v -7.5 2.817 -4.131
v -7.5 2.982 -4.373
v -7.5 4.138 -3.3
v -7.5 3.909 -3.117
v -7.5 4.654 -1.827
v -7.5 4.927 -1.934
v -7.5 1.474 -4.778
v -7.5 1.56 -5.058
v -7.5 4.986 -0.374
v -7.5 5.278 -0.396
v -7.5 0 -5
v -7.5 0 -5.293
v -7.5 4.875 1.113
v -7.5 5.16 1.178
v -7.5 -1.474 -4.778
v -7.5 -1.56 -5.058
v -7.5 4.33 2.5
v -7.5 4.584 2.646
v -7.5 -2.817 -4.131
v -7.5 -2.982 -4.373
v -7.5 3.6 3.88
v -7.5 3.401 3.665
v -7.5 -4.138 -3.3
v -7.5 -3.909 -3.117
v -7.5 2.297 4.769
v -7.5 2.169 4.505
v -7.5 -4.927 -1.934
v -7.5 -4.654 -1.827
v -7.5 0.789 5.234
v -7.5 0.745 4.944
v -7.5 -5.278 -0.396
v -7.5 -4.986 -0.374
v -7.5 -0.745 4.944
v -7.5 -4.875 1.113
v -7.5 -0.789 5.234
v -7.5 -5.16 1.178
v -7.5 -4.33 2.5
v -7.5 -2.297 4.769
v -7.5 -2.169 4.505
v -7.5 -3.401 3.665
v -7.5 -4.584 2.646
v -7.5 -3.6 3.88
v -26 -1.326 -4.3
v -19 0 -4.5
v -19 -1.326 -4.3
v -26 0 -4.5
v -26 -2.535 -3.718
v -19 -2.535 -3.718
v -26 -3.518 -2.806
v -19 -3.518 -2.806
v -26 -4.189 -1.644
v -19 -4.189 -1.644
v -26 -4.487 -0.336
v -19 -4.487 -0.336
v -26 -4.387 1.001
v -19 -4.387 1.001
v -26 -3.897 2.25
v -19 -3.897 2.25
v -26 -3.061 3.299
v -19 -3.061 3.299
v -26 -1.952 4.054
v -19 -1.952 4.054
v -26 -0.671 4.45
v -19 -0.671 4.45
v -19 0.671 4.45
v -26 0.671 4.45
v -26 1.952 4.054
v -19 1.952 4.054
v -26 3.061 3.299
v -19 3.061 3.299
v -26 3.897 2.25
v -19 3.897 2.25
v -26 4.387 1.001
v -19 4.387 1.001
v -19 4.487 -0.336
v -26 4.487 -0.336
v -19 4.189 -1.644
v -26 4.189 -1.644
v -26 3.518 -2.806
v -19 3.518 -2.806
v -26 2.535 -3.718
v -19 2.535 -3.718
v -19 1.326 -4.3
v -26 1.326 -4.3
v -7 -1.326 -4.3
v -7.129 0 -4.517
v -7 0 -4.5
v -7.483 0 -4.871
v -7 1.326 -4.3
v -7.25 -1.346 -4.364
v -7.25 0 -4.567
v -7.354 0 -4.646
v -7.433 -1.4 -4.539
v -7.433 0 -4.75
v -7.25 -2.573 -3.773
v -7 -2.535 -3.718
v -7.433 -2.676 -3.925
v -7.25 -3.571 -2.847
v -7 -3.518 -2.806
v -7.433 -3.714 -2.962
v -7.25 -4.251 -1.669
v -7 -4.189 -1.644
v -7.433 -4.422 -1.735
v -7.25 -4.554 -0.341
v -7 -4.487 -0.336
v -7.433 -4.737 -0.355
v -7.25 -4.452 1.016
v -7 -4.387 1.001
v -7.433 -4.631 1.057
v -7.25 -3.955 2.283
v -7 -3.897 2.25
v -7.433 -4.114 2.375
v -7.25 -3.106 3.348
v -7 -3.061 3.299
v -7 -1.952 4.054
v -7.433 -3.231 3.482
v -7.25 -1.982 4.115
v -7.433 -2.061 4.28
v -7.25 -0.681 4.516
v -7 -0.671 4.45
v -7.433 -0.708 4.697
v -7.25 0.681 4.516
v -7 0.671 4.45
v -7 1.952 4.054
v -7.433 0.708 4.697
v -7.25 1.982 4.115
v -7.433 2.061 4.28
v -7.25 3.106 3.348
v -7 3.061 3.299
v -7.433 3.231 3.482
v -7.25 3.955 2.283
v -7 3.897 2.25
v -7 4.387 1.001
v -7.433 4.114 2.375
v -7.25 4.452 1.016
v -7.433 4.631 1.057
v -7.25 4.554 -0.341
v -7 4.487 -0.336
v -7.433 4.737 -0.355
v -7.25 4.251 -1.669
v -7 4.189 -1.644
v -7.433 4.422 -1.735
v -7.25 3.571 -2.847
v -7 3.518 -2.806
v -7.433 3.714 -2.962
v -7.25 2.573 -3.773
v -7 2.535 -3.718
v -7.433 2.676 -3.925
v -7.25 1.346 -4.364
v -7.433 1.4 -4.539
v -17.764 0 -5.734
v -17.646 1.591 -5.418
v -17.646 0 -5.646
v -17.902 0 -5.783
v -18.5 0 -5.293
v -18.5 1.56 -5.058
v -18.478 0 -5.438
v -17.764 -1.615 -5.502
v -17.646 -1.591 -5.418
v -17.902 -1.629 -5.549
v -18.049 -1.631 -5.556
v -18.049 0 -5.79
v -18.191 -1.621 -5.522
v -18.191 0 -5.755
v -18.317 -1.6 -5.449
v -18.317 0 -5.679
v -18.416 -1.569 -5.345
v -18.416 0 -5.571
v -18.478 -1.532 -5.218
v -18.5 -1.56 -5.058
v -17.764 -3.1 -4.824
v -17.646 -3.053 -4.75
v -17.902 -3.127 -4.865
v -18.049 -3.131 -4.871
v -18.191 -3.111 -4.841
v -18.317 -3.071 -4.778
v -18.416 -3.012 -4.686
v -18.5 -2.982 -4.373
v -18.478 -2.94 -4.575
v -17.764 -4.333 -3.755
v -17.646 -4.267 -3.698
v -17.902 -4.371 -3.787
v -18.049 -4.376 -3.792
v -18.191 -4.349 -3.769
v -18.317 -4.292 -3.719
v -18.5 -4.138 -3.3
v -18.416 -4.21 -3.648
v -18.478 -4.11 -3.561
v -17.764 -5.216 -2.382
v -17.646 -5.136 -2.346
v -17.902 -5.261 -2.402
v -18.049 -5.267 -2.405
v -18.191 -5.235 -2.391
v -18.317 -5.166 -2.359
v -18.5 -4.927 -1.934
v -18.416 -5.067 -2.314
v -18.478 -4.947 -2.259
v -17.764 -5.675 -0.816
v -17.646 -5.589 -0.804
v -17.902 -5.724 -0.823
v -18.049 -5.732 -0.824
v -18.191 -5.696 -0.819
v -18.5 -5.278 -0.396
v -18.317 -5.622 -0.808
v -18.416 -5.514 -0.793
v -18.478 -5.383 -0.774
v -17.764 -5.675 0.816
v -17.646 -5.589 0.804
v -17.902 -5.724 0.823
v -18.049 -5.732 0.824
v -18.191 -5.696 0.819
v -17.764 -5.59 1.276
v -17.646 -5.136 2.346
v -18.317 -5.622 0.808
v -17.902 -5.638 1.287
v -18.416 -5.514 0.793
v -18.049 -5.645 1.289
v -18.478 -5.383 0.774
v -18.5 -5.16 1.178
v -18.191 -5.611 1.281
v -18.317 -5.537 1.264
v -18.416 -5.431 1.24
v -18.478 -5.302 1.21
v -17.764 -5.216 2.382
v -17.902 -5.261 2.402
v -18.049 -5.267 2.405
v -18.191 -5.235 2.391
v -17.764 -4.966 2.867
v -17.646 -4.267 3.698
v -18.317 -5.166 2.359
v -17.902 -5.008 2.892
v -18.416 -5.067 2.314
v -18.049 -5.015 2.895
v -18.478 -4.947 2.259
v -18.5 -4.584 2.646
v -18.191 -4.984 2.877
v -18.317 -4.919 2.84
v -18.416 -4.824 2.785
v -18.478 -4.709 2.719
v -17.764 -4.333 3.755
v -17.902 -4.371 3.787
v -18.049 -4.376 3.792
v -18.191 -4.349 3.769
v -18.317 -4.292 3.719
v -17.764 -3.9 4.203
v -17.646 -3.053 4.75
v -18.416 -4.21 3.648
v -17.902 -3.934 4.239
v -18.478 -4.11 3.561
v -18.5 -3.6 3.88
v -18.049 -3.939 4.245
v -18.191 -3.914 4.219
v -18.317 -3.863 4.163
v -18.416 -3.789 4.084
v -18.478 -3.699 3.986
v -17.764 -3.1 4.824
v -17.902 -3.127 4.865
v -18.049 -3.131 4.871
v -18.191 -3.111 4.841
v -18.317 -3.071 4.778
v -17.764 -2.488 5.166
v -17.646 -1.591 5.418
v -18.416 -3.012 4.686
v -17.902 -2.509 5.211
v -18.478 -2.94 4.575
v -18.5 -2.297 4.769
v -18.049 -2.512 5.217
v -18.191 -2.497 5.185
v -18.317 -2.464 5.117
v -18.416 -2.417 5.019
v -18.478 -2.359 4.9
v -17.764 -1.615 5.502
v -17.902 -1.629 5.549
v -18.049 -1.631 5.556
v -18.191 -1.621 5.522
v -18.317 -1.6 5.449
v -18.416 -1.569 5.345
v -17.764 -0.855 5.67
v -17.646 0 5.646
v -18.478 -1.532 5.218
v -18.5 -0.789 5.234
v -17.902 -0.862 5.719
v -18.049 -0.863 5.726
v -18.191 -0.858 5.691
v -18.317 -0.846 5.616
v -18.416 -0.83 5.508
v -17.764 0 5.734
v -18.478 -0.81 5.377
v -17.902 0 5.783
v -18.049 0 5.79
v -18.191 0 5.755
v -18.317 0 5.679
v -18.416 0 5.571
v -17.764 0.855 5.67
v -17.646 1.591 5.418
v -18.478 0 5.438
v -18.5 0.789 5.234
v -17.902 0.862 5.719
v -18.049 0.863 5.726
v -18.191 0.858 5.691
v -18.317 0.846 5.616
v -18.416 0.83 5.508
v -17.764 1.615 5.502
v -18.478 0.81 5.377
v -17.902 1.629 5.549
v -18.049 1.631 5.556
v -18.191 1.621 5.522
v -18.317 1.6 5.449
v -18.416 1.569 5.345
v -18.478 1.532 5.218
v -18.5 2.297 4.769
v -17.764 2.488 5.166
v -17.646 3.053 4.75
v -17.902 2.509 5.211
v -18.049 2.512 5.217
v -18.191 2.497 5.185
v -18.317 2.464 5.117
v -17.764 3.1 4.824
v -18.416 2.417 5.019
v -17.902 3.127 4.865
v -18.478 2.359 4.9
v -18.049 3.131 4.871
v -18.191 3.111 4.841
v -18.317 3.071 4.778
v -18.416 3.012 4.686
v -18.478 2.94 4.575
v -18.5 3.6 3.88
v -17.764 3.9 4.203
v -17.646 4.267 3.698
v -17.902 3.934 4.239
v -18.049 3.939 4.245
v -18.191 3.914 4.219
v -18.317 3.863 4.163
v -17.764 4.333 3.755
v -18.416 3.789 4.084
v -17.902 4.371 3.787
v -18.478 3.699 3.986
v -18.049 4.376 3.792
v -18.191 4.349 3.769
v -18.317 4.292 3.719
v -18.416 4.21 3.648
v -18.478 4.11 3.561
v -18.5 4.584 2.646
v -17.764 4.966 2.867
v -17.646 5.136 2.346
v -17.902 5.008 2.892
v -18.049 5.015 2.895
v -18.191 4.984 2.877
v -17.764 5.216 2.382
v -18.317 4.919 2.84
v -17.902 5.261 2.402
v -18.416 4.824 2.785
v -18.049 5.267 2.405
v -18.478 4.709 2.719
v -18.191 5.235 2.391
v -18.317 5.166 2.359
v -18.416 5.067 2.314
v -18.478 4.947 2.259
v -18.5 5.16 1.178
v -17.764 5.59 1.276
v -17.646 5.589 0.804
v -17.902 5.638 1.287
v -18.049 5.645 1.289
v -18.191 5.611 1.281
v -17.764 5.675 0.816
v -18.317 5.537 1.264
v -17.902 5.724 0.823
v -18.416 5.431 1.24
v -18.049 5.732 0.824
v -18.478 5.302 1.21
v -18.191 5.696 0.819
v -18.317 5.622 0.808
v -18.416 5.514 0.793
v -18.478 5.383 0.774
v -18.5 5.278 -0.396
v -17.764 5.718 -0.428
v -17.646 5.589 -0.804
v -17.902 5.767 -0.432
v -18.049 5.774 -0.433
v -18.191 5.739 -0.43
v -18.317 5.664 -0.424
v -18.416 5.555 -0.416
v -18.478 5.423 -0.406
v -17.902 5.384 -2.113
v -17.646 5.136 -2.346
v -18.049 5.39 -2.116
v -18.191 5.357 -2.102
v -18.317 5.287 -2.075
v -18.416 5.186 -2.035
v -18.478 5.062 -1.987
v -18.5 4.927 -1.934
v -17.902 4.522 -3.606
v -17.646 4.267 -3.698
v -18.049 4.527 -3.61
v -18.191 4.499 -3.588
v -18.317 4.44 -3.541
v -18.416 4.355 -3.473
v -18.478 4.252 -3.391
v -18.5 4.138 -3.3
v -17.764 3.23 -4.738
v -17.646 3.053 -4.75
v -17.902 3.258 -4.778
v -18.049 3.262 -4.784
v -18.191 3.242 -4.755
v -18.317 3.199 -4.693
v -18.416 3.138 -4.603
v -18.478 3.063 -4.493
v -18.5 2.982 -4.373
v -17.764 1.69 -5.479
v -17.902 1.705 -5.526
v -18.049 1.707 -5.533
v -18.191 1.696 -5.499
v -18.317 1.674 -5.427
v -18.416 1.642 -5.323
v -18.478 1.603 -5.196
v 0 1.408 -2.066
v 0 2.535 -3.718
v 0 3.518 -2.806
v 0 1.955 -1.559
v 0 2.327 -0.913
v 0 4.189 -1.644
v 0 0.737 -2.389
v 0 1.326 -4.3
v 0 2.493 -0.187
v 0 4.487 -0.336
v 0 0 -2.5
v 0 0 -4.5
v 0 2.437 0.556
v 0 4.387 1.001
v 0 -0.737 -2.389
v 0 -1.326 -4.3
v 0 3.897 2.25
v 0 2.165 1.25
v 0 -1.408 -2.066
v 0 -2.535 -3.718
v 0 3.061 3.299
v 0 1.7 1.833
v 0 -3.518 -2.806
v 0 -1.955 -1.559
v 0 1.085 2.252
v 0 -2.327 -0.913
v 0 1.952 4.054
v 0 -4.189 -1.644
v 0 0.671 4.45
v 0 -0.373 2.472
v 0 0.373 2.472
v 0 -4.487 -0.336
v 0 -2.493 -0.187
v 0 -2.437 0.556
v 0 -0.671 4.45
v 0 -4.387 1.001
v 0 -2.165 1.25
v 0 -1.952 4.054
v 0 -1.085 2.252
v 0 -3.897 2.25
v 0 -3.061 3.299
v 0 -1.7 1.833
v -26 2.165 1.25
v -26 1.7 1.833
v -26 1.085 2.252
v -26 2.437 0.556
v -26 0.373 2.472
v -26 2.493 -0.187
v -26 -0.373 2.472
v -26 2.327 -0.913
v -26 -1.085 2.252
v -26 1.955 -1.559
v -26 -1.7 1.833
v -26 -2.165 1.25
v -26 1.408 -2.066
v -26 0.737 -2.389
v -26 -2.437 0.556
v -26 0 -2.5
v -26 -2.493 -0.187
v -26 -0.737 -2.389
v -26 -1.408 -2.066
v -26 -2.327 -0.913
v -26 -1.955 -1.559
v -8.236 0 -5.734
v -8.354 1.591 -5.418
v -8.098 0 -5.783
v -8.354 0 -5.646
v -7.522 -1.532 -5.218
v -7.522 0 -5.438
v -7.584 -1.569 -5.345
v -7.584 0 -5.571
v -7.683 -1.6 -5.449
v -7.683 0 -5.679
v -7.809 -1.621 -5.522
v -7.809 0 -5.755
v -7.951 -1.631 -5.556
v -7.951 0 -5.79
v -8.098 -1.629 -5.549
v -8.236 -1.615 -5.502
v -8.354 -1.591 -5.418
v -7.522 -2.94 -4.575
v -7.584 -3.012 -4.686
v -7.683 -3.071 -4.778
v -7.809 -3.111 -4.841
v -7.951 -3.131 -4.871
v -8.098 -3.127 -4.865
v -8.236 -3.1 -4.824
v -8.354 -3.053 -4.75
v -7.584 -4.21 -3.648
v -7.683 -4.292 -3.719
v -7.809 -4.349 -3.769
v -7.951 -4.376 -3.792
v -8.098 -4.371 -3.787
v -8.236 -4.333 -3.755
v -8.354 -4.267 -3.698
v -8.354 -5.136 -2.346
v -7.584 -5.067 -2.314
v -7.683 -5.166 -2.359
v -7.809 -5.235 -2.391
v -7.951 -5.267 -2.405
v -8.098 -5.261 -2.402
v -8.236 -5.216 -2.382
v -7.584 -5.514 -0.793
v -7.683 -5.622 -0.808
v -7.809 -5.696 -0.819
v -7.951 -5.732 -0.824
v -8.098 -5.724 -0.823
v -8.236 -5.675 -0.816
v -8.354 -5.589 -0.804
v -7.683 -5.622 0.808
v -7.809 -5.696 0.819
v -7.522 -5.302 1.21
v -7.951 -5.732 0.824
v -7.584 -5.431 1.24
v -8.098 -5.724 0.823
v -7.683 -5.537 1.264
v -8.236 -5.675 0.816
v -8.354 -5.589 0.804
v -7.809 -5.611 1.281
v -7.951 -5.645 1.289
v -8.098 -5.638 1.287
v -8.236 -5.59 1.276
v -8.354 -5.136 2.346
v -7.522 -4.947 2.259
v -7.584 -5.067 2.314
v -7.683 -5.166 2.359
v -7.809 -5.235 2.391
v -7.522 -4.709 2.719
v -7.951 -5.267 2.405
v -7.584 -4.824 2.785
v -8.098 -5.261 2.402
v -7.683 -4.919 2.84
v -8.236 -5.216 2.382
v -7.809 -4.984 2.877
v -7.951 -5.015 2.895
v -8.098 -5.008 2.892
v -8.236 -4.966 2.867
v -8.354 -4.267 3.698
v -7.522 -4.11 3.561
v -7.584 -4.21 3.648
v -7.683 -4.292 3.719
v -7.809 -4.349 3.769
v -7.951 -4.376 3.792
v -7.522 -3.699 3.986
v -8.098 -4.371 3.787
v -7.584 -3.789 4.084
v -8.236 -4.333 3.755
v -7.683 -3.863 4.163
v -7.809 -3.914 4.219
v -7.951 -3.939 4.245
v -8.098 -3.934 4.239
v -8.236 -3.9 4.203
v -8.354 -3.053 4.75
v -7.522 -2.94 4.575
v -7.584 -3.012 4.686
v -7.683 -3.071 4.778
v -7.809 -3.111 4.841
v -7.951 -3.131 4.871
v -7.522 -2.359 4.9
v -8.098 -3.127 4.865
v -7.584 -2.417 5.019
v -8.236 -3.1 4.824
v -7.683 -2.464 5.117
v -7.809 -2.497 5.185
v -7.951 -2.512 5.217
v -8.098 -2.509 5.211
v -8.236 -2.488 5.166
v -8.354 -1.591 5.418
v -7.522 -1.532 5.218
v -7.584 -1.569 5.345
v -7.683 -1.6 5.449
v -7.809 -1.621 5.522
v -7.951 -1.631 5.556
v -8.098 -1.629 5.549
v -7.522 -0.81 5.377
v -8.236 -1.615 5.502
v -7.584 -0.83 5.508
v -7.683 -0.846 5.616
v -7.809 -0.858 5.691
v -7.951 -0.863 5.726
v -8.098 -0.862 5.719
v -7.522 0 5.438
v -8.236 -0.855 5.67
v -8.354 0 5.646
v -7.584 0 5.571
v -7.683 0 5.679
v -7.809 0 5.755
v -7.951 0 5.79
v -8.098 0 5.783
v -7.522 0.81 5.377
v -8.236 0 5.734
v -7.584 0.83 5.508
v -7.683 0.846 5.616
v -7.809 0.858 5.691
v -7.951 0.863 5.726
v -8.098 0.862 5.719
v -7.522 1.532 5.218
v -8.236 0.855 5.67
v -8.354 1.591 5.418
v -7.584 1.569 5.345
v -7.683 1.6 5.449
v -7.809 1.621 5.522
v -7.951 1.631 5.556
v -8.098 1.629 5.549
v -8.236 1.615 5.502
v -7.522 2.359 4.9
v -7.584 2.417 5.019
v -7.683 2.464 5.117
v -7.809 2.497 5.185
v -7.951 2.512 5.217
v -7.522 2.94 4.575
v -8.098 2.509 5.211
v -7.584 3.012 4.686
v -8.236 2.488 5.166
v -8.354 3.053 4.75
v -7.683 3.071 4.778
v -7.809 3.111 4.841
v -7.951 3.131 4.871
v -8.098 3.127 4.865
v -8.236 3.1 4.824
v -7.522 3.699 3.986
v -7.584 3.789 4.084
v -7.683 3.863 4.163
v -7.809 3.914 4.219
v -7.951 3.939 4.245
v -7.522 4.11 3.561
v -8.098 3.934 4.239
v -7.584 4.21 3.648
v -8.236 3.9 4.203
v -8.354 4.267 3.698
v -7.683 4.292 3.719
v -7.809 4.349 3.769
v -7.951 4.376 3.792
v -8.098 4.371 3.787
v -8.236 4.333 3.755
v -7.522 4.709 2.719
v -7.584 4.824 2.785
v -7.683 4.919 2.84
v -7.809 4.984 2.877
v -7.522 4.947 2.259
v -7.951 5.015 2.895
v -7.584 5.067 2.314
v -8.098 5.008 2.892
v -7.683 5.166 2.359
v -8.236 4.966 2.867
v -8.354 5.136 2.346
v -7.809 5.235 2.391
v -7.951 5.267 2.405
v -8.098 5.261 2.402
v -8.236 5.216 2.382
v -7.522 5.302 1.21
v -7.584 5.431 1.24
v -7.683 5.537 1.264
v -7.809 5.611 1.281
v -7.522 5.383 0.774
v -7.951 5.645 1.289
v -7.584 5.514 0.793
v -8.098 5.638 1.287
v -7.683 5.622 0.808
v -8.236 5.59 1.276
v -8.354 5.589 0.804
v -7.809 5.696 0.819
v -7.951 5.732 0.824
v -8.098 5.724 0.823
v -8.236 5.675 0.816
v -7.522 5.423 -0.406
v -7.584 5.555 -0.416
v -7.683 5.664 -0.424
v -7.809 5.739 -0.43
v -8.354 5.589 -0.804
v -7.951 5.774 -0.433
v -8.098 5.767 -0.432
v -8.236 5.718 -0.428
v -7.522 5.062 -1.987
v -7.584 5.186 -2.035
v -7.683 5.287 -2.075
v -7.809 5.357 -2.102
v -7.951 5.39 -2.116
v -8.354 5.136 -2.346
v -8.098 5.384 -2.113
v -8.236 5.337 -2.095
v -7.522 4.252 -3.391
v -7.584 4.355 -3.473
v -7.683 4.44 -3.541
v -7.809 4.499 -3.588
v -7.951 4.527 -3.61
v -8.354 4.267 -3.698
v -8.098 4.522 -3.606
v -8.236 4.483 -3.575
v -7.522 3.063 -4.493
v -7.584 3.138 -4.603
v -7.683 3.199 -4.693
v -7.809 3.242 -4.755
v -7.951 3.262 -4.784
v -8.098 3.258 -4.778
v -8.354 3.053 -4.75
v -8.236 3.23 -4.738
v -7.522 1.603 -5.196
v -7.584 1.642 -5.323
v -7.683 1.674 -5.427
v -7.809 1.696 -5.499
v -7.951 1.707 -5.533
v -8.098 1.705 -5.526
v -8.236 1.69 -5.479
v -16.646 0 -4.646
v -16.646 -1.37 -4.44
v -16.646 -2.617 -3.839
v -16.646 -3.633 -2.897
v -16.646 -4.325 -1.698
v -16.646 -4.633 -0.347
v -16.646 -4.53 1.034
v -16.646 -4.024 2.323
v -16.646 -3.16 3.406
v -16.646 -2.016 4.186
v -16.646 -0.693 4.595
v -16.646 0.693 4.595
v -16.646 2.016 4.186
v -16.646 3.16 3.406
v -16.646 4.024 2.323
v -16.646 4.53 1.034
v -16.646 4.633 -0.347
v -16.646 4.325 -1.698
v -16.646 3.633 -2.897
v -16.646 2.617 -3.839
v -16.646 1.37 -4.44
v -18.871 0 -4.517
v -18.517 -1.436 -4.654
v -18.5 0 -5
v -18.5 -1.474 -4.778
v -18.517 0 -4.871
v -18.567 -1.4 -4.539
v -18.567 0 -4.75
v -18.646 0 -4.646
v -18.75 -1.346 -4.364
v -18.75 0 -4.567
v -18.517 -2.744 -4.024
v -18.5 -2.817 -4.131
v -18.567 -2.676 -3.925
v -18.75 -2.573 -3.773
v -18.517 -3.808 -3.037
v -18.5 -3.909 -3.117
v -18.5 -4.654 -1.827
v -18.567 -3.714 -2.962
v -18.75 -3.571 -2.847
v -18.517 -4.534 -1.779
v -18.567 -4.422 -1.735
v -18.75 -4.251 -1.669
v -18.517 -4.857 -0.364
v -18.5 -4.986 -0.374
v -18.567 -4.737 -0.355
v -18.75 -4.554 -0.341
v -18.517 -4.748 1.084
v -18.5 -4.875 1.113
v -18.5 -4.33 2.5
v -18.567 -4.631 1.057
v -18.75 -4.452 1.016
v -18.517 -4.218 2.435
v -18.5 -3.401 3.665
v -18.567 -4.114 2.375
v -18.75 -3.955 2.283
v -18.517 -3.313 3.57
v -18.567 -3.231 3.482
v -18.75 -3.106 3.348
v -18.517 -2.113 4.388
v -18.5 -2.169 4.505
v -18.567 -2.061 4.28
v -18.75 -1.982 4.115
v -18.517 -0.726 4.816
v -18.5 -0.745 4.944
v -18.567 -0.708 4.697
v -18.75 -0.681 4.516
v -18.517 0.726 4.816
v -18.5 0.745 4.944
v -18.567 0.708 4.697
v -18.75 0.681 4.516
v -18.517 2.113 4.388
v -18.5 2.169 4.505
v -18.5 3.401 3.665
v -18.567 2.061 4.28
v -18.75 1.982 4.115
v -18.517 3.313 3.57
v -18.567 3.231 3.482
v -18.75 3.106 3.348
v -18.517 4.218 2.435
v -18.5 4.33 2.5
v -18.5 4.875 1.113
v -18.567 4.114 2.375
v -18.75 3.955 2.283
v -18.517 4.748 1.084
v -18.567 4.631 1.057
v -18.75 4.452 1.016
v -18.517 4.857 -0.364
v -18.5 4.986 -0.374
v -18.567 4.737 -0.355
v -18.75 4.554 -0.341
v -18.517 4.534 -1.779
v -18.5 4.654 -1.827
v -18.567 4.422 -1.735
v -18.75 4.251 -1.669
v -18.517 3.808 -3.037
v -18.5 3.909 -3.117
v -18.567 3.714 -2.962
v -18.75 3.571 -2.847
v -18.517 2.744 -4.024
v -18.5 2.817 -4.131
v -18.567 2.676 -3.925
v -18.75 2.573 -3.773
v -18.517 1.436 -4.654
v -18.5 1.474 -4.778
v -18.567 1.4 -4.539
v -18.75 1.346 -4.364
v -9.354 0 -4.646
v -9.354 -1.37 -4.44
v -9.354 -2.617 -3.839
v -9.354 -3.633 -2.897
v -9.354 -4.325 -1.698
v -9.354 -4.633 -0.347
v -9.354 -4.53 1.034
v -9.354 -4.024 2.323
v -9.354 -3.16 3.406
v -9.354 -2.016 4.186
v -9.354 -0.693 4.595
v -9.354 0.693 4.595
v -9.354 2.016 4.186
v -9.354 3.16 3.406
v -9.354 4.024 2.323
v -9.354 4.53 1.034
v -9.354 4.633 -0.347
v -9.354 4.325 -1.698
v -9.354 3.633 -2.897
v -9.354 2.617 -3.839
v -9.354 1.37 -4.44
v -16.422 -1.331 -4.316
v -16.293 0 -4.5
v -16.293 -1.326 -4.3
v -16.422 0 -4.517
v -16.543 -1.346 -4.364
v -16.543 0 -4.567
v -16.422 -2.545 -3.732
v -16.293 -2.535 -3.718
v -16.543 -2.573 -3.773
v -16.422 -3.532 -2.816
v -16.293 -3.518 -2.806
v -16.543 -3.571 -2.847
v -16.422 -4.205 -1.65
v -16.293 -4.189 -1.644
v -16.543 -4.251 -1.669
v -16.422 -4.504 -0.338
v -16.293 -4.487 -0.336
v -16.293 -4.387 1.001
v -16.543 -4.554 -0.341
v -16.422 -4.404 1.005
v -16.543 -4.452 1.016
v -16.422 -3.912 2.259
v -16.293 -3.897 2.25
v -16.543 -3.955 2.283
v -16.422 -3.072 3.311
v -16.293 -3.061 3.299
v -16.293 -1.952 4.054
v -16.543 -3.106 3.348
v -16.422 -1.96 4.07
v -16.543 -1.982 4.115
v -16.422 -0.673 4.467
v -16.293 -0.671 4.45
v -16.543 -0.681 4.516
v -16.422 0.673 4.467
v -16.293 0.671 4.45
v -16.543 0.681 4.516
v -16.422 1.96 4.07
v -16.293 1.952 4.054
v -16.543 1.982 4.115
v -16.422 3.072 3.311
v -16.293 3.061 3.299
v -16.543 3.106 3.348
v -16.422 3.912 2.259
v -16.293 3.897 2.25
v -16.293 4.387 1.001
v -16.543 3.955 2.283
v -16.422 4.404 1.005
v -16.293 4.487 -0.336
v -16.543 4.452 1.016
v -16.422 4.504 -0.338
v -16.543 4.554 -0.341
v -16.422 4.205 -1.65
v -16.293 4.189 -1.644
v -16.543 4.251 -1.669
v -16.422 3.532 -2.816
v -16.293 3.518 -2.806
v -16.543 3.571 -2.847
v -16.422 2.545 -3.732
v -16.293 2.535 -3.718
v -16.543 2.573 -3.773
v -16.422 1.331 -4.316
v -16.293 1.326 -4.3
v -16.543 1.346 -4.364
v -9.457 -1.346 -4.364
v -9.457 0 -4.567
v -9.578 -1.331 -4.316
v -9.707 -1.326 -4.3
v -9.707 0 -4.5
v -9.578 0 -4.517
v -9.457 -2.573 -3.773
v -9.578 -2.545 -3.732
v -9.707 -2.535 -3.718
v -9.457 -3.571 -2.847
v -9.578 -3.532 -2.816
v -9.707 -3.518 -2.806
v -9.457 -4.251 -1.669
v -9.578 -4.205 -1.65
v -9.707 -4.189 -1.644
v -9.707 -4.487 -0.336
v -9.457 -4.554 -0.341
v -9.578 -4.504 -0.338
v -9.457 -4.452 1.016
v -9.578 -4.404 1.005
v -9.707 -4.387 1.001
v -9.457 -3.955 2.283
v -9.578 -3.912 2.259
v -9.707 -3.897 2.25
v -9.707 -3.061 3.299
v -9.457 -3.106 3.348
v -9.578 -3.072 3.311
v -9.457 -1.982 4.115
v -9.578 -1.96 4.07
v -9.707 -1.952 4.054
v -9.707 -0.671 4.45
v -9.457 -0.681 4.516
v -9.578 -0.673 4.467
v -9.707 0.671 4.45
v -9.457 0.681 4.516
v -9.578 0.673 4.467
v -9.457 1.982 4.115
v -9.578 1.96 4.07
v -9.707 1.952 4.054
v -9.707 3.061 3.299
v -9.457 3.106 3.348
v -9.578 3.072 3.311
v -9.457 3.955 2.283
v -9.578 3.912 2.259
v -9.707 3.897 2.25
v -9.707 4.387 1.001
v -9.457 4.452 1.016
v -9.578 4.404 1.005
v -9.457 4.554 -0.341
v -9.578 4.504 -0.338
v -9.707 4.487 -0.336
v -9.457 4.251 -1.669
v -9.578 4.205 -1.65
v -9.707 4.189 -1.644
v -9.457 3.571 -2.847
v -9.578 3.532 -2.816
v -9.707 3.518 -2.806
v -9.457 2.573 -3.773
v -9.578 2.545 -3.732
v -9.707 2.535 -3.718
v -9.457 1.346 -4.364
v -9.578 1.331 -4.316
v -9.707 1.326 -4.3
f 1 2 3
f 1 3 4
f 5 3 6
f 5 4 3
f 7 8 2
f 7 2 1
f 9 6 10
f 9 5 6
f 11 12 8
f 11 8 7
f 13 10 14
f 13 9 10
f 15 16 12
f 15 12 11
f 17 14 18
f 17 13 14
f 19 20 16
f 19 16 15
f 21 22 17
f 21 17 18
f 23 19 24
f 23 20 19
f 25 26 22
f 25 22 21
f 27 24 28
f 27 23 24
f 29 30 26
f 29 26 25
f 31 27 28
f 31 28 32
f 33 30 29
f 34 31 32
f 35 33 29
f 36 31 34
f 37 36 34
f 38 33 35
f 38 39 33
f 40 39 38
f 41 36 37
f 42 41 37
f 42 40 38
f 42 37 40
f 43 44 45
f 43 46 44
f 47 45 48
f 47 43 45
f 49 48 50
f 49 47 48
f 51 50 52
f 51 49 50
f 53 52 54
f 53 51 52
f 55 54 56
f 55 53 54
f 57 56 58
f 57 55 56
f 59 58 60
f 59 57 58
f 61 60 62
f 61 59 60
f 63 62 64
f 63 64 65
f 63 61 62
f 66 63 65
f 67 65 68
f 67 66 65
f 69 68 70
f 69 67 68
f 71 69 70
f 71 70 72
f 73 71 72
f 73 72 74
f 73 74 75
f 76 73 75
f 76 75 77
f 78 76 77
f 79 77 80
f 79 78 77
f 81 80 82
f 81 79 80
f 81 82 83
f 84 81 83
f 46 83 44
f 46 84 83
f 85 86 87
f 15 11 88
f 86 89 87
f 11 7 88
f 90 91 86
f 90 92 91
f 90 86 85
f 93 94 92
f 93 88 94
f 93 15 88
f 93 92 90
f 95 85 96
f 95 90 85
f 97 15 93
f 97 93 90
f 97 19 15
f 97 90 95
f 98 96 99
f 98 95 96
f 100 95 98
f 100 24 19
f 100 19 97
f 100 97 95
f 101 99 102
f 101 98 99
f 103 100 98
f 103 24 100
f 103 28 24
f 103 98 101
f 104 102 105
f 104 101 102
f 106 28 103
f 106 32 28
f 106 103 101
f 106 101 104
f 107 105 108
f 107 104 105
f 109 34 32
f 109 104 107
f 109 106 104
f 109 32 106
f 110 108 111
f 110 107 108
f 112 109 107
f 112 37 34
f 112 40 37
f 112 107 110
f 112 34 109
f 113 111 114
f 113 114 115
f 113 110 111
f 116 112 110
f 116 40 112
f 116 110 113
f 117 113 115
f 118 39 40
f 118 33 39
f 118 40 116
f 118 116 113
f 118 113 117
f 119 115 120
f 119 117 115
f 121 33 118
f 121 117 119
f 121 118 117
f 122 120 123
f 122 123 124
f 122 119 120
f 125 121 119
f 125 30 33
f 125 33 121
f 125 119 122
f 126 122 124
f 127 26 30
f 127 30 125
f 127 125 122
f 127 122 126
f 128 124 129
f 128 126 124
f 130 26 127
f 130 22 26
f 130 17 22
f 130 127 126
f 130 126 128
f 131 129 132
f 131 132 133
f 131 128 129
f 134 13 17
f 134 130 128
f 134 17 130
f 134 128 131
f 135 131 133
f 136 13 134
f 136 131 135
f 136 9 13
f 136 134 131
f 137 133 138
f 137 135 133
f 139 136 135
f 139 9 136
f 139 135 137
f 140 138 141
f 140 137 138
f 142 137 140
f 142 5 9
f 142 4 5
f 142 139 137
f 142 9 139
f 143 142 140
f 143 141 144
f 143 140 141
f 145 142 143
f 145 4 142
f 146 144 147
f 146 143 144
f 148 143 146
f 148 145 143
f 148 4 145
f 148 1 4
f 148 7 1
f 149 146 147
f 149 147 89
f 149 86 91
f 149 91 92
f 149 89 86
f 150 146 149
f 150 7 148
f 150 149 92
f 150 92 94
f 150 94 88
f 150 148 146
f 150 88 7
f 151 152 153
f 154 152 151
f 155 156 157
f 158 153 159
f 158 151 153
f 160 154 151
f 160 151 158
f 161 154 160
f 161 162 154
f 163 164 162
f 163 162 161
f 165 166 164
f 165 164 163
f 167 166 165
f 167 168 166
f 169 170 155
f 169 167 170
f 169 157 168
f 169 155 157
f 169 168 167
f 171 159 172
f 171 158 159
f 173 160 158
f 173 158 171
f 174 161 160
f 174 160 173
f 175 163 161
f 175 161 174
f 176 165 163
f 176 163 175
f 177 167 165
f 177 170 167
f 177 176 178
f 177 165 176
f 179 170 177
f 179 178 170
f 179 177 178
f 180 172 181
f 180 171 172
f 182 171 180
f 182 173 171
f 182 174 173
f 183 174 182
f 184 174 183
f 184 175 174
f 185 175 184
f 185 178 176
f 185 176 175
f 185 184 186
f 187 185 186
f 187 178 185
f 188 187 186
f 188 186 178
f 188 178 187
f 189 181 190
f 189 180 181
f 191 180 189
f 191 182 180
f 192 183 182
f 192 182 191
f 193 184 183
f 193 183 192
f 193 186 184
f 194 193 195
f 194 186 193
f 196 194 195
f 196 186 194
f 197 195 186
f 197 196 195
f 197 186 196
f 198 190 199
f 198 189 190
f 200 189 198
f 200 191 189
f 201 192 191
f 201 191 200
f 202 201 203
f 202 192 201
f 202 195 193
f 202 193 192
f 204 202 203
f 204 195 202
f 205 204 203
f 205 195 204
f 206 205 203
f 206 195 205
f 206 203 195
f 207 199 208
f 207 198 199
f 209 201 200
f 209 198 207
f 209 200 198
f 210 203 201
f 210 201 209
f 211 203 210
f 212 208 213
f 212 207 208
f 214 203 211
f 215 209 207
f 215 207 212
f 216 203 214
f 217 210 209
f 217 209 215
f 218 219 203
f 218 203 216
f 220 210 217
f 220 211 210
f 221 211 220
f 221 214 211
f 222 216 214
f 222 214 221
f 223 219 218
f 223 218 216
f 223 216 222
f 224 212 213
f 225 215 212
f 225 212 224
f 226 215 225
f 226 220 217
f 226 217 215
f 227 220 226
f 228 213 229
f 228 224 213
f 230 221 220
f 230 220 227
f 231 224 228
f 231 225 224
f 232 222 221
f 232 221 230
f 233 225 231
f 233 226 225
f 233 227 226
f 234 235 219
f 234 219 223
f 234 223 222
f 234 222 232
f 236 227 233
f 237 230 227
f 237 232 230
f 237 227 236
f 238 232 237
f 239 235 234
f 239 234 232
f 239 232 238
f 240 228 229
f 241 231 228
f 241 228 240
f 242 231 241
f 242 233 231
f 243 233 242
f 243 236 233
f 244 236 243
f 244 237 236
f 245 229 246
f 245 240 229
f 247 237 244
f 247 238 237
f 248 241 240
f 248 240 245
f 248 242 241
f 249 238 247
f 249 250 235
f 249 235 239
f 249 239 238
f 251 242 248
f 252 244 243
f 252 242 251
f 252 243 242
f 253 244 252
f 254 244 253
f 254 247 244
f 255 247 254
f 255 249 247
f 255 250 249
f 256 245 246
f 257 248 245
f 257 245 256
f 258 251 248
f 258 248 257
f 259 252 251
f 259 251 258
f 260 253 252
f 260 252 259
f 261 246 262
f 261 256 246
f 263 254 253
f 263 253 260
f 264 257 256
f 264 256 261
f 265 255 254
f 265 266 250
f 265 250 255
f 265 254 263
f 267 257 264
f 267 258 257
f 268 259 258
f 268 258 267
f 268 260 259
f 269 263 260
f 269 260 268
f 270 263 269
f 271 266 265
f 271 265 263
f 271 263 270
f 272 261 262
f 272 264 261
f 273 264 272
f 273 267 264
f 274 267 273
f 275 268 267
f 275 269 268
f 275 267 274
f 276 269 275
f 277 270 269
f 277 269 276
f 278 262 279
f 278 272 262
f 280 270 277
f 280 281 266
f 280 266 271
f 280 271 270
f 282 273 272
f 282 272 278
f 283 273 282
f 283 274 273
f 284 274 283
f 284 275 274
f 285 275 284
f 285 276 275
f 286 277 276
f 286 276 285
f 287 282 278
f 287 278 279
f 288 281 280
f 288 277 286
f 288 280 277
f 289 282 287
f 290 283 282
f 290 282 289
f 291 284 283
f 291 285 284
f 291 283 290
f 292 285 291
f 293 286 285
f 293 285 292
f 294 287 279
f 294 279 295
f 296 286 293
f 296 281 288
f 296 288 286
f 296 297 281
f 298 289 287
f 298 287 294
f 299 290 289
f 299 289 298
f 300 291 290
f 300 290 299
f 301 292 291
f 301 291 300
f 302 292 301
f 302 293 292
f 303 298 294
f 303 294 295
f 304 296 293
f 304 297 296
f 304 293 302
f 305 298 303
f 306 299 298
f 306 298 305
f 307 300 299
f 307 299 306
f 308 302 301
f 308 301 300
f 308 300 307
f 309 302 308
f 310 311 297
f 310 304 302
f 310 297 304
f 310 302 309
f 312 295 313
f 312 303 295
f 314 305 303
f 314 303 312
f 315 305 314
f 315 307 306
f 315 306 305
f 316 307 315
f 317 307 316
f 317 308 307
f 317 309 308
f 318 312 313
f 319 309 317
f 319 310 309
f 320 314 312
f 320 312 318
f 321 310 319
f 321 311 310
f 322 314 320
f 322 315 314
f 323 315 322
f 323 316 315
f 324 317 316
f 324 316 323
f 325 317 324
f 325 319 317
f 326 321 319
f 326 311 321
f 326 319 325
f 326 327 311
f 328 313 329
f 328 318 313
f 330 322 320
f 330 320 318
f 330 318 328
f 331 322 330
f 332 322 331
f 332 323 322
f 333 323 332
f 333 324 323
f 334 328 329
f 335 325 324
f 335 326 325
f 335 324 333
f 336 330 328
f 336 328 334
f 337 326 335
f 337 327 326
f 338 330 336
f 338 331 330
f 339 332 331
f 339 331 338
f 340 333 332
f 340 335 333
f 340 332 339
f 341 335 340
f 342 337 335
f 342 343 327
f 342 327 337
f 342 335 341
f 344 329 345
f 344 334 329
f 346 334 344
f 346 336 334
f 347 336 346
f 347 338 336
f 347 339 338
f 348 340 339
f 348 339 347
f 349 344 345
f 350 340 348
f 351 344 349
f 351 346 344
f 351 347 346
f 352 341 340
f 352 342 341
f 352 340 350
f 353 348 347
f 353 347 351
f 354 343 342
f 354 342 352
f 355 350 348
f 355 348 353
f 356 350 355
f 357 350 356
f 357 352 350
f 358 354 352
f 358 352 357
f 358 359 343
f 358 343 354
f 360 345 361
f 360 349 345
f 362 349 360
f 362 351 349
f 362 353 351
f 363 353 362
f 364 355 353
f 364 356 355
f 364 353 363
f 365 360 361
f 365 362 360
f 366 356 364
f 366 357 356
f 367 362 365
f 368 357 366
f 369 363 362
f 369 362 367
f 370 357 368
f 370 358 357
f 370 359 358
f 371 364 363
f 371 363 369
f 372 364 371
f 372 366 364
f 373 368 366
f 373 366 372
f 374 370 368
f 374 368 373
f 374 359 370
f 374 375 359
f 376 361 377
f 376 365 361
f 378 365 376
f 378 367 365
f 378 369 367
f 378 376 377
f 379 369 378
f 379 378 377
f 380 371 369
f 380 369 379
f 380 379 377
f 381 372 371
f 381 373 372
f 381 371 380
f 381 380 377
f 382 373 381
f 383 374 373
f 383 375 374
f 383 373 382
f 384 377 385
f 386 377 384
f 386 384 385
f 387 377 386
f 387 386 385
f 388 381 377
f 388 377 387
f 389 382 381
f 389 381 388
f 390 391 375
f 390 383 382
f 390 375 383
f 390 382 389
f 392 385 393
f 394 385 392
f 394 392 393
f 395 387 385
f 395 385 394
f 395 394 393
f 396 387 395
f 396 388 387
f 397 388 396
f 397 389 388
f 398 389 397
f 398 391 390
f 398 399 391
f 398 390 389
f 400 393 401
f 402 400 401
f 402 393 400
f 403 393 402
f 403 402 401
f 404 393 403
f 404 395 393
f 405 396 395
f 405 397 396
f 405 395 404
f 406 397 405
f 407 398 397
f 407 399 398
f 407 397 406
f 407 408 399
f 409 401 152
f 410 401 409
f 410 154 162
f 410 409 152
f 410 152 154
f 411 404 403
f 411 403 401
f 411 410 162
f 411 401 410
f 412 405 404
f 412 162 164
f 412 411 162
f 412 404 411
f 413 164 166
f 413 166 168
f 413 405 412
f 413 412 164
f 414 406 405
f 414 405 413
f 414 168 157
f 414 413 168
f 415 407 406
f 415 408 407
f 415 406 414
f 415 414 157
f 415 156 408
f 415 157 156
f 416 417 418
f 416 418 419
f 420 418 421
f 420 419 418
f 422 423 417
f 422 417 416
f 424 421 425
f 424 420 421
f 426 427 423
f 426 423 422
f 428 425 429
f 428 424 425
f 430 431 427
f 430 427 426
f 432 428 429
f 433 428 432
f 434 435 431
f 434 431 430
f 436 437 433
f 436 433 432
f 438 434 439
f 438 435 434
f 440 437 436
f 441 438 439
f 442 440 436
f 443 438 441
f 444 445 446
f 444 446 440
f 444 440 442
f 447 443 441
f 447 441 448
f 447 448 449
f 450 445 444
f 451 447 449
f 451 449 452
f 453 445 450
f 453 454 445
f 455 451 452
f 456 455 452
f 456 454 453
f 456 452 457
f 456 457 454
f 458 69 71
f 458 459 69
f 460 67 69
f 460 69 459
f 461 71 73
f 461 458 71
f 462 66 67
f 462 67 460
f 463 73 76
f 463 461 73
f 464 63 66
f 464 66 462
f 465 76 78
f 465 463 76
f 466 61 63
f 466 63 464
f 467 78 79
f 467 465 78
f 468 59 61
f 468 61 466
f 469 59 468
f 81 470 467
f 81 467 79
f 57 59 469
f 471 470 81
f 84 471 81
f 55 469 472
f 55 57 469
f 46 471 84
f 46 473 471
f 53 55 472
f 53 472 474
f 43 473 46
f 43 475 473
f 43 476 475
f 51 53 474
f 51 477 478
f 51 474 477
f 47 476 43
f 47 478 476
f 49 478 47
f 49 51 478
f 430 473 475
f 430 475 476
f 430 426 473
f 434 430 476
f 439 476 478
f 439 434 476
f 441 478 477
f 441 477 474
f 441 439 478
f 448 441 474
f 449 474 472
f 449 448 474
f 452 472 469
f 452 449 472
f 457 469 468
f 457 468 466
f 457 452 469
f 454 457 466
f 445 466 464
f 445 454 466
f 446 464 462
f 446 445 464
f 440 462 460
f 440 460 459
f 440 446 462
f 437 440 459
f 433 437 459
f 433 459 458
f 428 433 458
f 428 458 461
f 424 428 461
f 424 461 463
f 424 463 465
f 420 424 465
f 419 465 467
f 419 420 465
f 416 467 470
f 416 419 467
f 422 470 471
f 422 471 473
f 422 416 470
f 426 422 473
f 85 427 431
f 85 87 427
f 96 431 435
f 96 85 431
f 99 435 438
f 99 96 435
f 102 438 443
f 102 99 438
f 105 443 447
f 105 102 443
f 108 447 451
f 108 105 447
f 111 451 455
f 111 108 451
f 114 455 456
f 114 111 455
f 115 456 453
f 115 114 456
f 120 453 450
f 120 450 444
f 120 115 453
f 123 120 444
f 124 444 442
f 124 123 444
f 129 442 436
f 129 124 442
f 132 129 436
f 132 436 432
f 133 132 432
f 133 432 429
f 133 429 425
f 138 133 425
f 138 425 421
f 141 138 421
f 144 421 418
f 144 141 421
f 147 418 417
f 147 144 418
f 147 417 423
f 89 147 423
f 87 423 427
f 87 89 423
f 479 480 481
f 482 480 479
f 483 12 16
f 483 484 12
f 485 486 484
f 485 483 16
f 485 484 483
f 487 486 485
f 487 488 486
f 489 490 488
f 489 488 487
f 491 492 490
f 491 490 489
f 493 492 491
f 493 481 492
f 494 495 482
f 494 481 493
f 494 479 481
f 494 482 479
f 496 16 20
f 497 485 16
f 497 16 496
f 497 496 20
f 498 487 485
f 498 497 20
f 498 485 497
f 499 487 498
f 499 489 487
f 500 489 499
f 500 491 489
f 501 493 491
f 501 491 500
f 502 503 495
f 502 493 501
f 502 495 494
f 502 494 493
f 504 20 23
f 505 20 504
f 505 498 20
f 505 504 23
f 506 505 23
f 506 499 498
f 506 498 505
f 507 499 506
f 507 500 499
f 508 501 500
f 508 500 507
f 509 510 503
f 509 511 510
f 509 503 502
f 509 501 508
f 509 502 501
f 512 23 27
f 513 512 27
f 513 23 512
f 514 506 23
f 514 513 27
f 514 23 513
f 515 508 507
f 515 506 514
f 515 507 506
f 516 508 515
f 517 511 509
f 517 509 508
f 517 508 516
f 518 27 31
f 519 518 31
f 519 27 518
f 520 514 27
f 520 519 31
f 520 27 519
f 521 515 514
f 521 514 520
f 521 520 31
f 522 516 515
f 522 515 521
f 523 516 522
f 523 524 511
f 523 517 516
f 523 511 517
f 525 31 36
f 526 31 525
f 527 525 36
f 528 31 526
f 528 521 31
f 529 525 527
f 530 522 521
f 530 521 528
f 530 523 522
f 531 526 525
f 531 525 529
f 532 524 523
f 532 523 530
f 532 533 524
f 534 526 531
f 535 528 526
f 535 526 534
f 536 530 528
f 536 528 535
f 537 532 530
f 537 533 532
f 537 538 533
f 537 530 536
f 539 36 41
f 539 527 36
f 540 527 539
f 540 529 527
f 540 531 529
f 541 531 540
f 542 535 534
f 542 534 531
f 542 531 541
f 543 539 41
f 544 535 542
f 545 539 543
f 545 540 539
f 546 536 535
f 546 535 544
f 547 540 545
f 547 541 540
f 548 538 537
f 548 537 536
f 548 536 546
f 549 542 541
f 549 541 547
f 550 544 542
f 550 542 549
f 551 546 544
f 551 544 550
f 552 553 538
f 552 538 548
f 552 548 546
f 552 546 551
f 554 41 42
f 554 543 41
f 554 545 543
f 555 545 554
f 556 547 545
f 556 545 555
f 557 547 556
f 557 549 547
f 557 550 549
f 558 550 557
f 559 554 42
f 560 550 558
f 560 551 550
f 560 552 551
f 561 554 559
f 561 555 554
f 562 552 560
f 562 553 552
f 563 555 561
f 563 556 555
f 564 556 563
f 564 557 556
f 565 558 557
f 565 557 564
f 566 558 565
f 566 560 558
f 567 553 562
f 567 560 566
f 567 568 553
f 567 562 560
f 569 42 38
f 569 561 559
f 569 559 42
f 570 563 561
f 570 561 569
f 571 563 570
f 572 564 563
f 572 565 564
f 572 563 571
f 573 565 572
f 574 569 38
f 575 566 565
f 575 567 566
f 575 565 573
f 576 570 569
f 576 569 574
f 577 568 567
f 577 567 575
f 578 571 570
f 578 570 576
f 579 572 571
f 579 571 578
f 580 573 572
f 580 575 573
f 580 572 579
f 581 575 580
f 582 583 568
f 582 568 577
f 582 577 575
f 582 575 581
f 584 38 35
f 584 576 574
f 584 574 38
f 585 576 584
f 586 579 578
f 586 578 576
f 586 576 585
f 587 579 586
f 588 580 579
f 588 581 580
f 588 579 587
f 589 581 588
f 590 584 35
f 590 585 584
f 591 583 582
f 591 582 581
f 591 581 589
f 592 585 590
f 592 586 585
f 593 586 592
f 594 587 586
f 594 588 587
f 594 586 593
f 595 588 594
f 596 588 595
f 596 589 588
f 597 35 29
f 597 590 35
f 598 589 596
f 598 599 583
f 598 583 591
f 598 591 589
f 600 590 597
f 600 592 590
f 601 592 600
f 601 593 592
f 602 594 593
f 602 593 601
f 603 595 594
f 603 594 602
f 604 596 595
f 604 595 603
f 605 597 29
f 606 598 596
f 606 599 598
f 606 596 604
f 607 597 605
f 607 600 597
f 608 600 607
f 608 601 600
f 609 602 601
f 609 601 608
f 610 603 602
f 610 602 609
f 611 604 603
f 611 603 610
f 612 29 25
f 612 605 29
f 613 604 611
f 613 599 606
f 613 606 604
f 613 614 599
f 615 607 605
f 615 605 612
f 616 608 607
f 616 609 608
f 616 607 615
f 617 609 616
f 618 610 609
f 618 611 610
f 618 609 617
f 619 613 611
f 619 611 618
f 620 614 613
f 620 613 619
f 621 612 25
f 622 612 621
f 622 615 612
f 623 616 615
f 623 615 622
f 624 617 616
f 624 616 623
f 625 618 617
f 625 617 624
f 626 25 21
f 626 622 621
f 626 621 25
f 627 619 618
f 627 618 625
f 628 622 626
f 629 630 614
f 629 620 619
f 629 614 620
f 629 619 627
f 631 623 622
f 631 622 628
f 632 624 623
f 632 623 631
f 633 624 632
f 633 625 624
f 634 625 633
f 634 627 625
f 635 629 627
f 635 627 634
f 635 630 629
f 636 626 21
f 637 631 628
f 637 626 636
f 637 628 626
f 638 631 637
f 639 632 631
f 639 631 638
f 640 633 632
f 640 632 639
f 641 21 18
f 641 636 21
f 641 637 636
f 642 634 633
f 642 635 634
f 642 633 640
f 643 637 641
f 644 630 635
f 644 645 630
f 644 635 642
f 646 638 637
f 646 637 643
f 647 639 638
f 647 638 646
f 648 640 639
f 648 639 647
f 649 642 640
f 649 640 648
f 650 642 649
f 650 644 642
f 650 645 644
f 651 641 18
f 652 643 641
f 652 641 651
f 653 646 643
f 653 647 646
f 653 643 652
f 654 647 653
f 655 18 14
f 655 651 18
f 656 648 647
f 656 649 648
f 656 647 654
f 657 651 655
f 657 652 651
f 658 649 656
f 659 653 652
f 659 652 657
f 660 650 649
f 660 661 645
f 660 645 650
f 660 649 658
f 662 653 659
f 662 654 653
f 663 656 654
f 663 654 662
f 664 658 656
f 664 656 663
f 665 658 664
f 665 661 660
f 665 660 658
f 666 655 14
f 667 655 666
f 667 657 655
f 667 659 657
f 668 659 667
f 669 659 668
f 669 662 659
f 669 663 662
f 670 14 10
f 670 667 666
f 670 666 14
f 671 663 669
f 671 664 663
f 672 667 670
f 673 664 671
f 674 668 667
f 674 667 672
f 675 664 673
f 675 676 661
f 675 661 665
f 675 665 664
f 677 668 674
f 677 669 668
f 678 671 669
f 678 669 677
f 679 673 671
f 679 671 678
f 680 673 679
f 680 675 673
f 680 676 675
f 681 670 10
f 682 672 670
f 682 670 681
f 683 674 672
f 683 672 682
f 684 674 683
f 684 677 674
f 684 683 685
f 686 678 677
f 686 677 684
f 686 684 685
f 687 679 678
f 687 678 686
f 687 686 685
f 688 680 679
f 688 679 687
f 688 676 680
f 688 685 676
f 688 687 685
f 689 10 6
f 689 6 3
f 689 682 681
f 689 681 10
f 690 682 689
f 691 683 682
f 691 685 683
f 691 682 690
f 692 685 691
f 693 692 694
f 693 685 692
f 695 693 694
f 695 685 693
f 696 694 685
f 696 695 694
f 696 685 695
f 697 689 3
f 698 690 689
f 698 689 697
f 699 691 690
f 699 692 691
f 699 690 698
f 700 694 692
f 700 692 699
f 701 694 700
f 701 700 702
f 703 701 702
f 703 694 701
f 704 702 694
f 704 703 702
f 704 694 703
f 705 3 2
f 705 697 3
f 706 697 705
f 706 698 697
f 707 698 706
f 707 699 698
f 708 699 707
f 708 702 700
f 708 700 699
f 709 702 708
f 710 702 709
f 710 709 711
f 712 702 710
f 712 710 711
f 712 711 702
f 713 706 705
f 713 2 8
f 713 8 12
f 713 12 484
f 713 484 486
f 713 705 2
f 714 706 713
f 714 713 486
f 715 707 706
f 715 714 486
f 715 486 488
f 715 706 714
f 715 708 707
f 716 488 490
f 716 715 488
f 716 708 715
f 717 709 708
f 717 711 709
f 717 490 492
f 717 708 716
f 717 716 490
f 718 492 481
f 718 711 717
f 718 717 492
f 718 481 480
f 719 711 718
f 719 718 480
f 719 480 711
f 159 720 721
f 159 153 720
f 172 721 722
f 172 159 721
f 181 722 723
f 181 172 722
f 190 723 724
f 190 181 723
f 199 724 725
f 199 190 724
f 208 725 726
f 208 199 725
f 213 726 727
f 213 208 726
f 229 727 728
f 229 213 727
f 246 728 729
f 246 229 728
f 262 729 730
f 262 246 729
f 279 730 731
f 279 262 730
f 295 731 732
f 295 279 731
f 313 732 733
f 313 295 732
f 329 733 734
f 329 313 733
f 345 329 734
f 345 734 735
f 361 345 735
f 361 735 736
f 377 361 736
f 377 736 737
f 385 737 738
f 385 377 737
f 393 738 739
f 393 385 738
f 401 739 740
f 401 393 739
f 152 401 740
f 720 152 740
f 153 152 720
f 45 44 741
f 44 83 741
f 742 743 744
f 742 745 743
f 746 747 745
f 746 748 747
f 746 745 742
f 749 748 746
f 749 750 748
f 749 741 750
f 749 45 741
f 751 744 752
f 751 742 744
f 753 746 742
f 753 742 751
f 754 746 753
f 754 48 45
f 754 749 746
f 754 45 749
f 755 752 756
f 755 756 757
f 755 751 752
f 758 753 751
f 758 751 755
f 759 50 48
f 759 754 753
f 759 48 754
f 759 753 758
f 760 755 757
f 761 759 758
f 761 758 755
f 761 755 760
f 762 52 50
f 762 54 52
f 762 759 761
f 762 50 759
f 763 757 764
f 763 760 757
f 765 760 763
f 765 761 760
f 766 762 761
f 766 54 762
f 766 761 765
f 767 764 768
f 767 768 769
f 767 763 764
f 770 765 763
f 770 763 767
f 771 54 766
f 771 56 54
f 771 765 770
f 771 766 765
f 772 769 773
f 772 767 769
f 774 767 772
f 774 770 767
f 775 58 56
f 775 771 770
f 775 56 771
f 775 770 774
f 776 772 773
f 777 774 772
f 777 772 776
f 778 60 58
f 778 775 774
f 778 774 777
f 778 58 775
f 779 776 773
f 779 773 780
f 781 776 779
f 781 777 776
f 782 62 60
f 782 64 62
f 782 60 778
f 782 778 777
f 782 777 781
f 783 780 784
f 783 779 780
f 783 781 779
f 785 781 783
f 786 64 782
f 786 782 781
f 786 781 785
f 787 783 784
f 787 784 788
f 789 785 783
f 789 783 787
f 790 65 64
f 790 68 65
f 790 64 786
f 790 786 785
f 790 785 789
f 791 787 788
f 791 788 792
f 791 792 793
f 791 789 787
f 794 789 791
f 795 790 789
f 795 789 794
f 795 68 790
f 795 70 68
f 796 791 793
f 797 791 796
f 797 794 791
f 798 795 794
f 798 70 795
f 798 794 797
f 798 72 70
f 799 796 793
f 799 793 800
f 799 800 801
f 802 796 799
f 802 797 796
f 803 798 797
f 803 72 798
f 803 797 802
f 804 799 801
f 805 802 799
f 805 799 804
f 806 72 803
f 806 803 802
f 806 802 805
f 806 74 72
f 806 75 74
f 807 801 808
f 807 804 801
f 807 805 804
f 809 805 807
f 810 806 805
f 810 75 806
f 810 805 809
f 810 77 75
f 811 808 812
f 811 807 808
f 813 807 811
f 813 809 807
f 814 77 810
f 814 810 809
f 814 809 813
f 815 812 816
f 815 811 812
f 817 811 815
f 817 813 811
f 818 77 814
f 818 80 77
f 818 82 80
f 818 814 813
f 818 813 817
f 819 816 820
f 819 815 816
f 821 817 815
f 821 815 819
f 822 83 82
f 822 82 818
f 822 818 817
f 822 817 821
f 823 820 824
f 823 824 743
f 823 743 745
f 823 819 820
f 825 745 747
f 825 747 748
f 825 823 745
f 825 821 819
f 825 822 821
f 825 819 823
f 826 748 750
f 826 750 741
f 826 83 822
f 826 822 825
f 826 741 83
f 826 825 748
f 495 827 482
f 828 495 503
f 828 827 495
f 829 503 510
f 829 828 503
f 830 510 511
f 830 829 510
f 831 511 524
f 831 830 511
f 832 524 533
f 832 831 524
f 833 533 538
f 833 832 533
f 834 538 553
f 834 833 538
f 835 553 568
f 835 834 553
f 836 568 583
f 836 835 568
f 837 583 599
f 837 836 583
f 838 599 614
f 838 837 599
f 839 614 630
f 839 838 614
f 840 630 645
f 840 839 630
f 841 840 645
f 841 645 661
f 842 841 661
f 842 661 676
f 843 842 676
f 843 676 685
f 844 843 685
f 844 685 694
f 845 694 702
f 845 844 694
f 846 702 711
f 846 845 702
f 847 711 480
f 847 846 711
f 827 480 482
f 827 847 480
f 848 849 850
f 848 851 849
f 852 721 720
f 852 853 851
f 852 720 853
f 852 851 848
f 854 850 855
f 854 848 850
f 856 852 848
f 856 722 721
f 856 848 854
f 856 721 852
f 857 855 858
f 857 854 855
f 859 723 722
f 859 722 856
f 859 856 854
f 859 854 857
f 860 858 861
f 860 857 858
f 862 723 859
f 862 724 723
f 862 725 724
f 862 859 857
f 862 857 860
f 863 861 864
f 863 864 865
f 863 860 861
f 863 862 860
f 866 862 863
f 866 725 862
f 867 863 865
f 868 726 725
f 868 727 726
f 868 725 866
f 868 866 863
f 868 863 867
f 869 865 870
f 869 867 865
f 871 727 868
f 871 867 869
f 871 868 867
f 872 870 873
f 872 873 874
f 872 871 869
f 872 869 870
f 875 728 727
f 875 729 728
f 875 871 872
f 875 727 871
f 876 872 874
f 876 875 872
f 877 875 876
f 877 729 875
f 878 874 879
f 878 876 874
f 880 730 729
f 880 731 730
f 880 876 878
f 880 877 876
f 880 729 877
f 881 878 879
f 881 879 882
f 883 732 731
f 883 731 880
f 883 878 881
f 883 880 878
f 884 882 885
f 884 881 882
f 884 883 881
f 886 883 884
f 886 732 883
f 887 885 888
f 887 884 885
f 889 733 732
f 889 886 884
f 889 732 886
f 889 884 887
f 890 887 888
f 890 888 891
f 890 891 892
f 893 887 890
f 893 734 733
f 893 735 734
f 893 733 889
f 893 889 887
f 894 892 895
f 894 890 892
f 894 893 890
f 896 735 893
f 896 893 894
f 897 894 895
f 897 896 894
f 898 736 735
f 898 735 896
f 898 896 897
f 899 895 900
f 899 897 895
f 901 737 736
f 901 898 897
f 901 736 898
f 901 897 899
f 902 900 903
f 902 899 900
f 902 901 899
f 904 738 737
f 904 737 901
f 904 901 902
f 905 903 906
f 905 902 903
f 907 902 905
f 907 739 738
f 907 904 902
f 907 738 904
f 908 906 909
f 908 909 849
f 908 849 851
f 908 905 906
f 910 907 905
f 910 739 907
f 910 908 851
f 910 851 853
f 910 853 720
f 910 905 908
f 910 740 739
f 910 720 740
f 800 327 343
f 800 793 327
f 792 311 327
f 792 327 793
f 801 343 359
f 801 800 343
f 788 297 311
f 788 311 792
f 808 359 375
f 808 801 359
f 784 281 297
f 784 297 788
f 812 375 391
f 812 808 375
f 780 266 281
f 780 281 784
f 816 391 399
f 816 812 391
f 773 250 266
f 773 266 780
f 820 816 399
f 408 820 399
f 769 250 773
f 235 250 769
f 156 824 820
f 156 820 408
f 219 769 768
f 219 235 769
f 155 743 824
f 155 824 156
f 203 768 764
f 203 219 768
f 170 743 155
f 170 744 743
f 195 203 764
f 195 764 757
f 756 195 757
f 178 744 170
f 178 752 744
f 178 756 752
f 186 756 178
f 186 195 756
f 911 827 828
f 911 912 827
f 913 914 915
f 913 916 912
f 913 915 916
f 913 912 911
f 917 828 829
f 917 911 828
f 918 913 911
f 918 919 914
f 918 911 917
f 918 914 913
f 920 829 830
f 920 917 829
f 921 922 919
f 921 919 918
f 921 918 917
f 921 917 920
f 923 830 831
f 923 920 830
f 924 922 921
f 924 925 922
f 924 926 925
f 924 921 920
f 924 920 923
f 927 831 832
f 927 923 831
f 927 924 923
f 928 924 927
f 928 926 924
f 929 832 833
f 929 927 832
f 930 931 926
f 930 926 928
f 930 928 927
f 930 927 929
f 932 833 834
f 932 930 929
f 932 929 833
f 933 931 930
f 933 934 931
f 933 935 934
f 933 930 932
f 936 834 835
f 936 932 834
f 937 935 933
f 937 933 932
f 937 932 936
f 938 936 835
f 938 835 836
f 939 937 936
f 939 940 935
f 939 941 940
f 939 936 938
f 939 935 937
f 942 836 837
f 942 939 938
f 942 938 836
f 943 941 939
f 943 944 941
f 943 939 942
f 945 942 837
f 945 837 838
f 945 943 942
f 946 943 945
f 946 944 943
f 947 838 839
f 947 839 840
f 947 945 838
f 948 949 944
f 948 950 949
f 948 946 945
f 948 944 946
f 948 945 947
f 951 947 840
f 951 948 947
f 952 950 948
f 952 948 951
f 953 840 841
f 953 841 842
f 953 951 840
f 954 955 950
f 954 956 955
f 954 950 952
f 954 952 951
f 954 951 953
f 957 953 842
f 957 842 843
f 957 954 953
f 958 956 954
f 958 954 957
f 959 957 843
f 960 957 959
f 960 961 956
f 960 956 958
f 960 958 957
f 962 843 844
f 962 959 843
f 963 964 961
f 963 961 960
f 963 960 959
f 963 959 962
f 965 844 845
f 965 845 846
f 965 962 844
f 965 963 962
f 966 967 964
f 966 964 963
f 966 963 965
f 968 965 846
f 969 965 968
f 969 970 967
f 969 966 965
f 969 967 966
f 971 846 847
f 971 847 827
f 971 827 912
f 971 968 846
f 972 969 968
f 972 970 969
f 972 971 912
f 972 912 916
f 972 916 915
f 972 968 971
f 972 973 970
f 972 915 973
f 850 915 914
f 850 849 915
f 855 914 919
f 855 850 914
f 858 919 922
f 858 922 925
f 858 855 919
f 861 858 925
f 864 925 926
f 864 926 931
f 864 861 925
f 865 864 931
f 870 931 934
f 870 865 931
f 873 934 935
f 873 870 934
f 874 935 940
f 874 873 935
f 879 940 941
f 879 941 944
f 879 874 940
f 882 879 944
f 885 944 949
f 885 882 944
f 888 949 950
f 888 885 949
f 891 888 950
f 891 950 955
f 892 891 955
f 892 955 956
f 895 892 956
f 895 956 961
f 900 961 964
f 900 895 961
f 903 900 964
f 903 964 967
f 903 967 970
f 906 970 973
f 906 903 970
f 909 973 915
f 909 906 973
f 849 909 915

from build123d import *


with BuildPart() as part:
    # Sketch1 → Revolve1 (revolve)
    with BuildSketch(Plane.XY, mode=Mode.PRIVATE) as revolve1_sk:
        with BuildLine():
            Line((-26, 2.5), (0, 2.5))
            Line((0, 2.5), (0, 4.5))
            Line((0, 4.5), (-7, 4.5))
            ThreePointArc((-7, 4.5), (-7.353553391, 4.646446609), (-7.5, 5))
            Line((-7.5, 5), (-7.5, 5.292893219))
            ThreePointArc((-7.5, 5.292893219), (-7.808658284, 5.754832985), (-8.353553391, 5.646446609))
            Line((-8.353553391, 5.646446609), (-9.353553391, 4.646446609))
            ThreePointArc((-9.353553391, 4.646446609), (-9.515765065, 4.538060234), (-9.707106781, 4.5))
            Line((-9.707106781, 4.5), (-16.292893219, 4.5))
            ThreePointArc((-16.292893219, 4.5), (-16.484234935, 4.538060234), (-16.646446609, 4.646446609))
            Line((-16.646446609, 4.646446609), (-17.646446609, 5.646446609))
            ThreePointArc((-17.646446609, 5.646446609), (-18.191341716, 5.754832985), (-18.5, 5.292893219))
            Line((-18.5, 5.292893219), (-18.5, 5))
            ThreePointArc((-18.5, 5), (-18.646446609, 4.646446609), (-19, 4.5))
            Line((-19, 4.5), (-26, 4.5))
            Line((-26, 4.5), (-26, 2.5))
        make_face()
    revolve(revolve1_sk.sketch.rotate(Axis((0, 0, 0), (-1, 0, 0)), 90), axis=Axis((0, 0, 0), (-1, 0, 0)))


solid = part.part
